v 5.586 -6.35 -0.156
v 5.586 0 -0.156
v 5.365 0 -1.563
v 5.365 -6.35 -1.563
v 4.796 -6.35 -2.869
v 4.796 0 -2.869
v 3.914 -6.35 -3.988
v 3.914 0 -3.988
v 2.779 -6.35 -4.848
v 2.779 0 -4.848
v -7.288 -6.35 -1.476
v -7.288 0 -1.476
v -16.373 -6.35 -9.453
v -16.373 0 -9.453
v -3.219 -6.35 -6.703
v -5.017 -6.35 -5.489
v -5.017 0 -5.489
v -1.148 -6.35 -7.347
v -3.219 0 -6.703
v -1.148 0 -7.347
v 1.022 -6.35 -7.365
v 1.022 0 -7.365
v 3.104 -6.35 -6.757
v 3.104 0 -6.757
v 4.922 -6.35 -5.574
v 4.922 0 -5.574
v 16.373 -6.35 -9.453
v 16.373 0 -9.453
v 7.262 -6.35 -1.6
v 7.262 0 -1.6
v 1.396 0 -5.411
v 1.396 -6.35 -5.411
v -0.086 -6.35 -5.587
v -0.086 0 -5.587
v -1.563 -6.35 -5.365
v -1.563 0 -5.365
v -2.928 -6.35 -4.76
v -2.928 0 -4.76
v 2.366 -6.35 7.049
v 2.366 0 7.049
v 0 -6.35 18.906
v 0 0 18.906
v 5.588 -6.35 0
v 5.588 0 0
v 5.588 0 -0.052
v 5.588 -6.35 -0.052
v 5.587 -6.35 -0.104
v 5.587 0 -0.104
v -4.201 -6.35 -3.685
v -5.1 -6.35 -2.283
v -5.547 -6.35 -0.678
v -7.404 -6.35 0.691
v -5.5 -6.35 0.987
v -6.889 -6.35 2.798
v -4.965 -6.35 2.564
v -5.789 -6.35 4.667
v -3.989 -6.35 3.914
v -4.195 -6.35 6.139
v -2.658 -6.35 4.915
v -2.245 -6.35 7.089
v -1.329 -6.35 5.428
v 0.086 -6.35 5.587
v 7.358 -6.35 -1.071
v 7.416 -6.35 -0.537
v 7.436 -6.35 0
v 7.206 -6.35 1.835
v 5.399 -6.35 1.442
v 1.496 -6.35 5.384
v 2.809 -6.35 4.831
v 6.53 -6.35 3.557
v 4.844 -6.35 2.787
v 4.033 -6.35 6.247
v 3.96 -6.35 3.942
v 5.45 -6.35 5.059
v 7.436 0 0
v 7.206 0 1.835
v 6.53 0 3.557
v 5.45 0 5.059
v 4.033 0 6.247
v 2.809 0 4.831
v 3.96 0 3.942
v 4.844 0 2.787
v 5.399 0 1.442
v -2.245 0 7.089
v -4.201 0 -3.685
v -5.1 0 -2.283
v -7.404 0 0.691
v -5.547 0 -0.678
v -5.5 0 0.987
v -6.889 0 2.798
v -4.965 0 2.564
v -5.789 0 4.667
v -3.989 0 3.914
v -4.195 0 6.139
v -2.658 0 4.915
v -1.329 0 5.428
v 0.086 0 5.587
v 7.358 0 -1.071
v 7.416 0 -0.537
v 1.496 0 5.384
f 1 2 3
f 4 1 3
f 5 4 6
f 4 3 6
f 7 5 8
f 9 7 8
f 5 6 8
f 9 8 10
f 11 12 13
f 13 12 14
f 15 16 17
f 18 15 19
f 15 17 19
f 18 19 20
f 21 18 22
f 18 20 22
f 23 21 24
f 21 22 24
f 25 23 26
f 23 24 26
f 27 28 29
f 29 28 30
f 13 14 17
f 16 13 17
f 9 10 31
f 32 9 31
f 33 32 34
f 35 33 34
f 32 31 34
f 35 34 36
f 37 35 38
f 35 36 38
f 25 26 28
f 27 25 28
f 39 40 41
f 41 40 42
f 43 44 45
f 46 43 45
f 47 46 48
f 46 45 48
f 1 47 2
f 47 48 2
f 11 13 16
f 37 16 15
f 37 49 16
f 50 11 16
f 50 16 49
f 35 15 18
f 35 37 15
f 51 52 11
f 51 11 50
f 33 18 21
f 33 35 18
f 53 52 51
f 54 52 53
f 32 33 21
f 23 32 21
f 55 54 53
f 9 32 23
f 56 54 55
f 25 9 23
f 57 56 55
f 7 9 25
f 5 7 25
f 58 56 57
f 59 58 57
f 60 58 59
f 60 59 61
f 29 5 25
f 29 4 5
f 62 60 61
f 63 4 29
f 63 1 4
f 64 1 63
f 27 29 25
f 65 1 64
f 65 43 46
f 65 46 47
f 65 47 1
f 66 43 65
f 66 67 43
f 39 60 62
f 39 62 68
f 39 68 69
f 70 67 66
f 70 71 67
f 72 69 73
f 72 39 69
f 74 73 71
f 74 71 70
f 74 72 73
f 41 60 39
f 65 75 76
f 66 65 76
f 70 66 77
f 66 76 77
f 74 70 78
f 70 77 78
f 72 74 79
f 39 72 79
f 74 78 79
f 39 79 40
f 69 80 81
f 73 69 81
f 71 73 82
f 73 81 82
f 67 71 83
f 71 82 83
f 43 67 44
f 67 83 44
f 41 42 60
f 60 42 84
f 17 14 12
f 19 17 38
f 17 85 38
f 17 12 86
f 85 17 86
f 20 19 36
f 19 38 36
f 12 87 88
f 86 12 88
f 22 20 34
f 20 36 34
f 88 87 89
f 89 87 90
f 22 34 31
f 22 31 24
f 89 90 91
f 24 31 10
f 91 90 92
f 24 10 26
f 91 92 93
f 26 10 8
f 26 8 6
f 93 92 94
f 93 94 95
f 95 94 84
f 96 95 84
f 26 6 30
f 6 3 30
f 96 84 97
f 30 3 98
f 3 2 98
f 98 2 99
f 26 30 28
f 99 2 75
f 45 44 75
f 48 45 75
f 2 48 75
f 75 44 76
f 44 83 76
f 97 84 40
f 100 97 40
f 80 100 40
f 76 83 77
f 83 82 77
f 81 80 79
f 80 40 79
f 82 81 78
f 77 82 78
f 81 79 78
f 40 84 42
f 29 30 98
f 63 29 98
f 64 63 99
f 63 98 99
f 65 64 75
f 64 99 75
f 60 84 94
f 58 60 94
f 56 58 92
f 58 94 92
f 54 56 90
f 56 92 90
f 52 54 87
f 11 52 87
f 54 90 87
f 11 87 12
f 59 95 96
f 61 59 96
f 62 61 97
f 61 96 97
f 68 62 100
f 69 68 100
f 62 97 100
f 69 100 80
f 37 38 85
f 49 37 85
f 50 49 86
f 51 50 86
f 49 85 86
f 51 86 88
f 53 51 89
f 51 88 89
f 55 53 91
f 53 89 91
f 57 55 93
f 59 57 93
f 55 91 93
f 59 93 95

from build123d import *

# Parameters (mm, degrees)
F1_DEPTH = 6.35


with BuildPart() as f1:
    # F0 (on Front) → F1 (new body)
    with BuildSketch(Plane.XZ):
        with BuildLine():
            ThreePointArc((-5.5879735466, 0.0171942529), (-4.7955253497, 2.8685676949), (-2.6580116206, 4.9153553508))
            Line((-2.6580116206, 4.9153553508), (-2.2450949747, 7.0888402589))
            ThreePointArc((-2.2450949747, 7.0888402589), (-6.4075834438, 3.7729275201), (-7.2879952633, -1.4755448838))
            Line((-7.2879952633, -1.4755448838), (-5.5879735466, 0.0171942529))
        make_face()
        with BuildLine():
            ThreePointArc((-2.6580116206, 4.9153553508), (0.0864898214, 5.5873306248), (2.8088774331, 4.8307299206))
            Line((2.8088774331, 4.8307299206), (2.3661382778, 7.0493614826))
            ThreePointArc((2.3661382778, 7.0493614826), (0.0636593572, 7.4355937993), (-2.2450949747, 7.0888402589))
            Line((-2.2450949747, 7.0888402589), (-2.6580116206, 4.9153553508))
        make_face()
        with BuildLine():
            Line((2.3661382778, 7.0493614826), (2.8088774331, 4.8307299206))
            ThreePointArc((2.8088774331, 4.8307299206), (4.8436427973, 2.7865513546), (5.588, 0))
            ThreePointArc((5.588, 0), (5.5874570768, -0.0778936122), (5.5858284127, -0.1557720884))
            Line((5.5858284127, -0.1557720884), (7.2616632349, -1.6001108475))
            ThreePointArc((7.2616632349, -1.6001108475), (7.3921872476, -0.8047828019), (7.435866302, 0))
            ThreePointArc((7.435866302, 0), (6.0368201707, 4.3415331264), (2.3661382778, 7.0493614826))
        make_face()
        with BuildLine():
            ThreePointArc((-2.2450949747, 7.0888402589), (0.0636593572, 7.4355937993), (2.3661382778, 7.0493614826))
            Line((2.3661382778, 7.0493614826), (0, 18.9064312726))
            Line((0, 18.9064312726), (-2.2450949747, 7.0888402589))
        make_face()
        with BuildLine():
            Line((16.373449777, -9.4532156363), (7.2616632349, -1.6001108475))
            ThreePointArc((7.2616632349, -1.6001108475), (6.4075834438, -3.7729275201), (4.9218569854, -5.5738165987))
            Line((4.9218569854, -5.5738165987), (16.373449777, -9.4532156363))
        make_face()
        with BuildLine():
            Line((7.2616632349, -1.6001108475), (5.5858284127, -0.1557720884))
            ThreePointArc((5.5858284127, -0.1557720884), (4.7955253497, -2.8685676949), (2.7790961135, -4.8479241735))
            Line((2.7790961135, -4.8479241735), (4.9218569854, -5.5738165987))
            ThreePointArc((4.9218569854, -5.5738165987), (6.4075834438, -3.7729275201), (7.2616632349, -1.6001108475))
        make_face()
        with BuildLine():
            ThreePointArc((2.7790961135, -4.8479241735), (-0.0864898214, -5.5873306248), (-2.9278167921, -4.7595832624))
            Line((-2.9278167921, -4.7595832624), (-5.0165682602, -5.4887294114))
            ThreePointArc((-5.0165682602, -5.4887294114), (-0.0636593572, -7.4355937993), (4.9218569854, -5.5738165987))
            Line((4.9218569854, -5.5738165987), (2.7790961135, -4.8479241735))
        make_face()
        with BuildLine():
            Line((-16.373449777, -9.4532156363), (-5.0165682602, -5.4887294114))
            ThreePointArc((-5.0165682602, -5.4887294114), (-6.471242801, -3.6626662791), (-7.2879952633, -1.4755448838))
            Line((-7.2879952633, -1.4755448838), (-16.373449777, -9.4532156363))
        make_face()
        with BuildLine():
            Line((-5.0165682602, -5.4887294114), (-2.9278167921, -4.7595832624))
            ThreePointArc((-2.9278167921, -4.7595832624), (-4.8820151711, -2.7187629299), (-5.5879735466, 0.0171942529))
            Line((-5.5879735466, 0.0171942529), (-7.2879952633, -1.4755448838))
            ThreePointArc((-7.2879952633, -1.4755448838), (-6.471242801, -3.6626662791), (-5.0165682602, -5.4887294114))
        make_face()
    extrude(amount=F1_DEPTH)


solid = f1.part
